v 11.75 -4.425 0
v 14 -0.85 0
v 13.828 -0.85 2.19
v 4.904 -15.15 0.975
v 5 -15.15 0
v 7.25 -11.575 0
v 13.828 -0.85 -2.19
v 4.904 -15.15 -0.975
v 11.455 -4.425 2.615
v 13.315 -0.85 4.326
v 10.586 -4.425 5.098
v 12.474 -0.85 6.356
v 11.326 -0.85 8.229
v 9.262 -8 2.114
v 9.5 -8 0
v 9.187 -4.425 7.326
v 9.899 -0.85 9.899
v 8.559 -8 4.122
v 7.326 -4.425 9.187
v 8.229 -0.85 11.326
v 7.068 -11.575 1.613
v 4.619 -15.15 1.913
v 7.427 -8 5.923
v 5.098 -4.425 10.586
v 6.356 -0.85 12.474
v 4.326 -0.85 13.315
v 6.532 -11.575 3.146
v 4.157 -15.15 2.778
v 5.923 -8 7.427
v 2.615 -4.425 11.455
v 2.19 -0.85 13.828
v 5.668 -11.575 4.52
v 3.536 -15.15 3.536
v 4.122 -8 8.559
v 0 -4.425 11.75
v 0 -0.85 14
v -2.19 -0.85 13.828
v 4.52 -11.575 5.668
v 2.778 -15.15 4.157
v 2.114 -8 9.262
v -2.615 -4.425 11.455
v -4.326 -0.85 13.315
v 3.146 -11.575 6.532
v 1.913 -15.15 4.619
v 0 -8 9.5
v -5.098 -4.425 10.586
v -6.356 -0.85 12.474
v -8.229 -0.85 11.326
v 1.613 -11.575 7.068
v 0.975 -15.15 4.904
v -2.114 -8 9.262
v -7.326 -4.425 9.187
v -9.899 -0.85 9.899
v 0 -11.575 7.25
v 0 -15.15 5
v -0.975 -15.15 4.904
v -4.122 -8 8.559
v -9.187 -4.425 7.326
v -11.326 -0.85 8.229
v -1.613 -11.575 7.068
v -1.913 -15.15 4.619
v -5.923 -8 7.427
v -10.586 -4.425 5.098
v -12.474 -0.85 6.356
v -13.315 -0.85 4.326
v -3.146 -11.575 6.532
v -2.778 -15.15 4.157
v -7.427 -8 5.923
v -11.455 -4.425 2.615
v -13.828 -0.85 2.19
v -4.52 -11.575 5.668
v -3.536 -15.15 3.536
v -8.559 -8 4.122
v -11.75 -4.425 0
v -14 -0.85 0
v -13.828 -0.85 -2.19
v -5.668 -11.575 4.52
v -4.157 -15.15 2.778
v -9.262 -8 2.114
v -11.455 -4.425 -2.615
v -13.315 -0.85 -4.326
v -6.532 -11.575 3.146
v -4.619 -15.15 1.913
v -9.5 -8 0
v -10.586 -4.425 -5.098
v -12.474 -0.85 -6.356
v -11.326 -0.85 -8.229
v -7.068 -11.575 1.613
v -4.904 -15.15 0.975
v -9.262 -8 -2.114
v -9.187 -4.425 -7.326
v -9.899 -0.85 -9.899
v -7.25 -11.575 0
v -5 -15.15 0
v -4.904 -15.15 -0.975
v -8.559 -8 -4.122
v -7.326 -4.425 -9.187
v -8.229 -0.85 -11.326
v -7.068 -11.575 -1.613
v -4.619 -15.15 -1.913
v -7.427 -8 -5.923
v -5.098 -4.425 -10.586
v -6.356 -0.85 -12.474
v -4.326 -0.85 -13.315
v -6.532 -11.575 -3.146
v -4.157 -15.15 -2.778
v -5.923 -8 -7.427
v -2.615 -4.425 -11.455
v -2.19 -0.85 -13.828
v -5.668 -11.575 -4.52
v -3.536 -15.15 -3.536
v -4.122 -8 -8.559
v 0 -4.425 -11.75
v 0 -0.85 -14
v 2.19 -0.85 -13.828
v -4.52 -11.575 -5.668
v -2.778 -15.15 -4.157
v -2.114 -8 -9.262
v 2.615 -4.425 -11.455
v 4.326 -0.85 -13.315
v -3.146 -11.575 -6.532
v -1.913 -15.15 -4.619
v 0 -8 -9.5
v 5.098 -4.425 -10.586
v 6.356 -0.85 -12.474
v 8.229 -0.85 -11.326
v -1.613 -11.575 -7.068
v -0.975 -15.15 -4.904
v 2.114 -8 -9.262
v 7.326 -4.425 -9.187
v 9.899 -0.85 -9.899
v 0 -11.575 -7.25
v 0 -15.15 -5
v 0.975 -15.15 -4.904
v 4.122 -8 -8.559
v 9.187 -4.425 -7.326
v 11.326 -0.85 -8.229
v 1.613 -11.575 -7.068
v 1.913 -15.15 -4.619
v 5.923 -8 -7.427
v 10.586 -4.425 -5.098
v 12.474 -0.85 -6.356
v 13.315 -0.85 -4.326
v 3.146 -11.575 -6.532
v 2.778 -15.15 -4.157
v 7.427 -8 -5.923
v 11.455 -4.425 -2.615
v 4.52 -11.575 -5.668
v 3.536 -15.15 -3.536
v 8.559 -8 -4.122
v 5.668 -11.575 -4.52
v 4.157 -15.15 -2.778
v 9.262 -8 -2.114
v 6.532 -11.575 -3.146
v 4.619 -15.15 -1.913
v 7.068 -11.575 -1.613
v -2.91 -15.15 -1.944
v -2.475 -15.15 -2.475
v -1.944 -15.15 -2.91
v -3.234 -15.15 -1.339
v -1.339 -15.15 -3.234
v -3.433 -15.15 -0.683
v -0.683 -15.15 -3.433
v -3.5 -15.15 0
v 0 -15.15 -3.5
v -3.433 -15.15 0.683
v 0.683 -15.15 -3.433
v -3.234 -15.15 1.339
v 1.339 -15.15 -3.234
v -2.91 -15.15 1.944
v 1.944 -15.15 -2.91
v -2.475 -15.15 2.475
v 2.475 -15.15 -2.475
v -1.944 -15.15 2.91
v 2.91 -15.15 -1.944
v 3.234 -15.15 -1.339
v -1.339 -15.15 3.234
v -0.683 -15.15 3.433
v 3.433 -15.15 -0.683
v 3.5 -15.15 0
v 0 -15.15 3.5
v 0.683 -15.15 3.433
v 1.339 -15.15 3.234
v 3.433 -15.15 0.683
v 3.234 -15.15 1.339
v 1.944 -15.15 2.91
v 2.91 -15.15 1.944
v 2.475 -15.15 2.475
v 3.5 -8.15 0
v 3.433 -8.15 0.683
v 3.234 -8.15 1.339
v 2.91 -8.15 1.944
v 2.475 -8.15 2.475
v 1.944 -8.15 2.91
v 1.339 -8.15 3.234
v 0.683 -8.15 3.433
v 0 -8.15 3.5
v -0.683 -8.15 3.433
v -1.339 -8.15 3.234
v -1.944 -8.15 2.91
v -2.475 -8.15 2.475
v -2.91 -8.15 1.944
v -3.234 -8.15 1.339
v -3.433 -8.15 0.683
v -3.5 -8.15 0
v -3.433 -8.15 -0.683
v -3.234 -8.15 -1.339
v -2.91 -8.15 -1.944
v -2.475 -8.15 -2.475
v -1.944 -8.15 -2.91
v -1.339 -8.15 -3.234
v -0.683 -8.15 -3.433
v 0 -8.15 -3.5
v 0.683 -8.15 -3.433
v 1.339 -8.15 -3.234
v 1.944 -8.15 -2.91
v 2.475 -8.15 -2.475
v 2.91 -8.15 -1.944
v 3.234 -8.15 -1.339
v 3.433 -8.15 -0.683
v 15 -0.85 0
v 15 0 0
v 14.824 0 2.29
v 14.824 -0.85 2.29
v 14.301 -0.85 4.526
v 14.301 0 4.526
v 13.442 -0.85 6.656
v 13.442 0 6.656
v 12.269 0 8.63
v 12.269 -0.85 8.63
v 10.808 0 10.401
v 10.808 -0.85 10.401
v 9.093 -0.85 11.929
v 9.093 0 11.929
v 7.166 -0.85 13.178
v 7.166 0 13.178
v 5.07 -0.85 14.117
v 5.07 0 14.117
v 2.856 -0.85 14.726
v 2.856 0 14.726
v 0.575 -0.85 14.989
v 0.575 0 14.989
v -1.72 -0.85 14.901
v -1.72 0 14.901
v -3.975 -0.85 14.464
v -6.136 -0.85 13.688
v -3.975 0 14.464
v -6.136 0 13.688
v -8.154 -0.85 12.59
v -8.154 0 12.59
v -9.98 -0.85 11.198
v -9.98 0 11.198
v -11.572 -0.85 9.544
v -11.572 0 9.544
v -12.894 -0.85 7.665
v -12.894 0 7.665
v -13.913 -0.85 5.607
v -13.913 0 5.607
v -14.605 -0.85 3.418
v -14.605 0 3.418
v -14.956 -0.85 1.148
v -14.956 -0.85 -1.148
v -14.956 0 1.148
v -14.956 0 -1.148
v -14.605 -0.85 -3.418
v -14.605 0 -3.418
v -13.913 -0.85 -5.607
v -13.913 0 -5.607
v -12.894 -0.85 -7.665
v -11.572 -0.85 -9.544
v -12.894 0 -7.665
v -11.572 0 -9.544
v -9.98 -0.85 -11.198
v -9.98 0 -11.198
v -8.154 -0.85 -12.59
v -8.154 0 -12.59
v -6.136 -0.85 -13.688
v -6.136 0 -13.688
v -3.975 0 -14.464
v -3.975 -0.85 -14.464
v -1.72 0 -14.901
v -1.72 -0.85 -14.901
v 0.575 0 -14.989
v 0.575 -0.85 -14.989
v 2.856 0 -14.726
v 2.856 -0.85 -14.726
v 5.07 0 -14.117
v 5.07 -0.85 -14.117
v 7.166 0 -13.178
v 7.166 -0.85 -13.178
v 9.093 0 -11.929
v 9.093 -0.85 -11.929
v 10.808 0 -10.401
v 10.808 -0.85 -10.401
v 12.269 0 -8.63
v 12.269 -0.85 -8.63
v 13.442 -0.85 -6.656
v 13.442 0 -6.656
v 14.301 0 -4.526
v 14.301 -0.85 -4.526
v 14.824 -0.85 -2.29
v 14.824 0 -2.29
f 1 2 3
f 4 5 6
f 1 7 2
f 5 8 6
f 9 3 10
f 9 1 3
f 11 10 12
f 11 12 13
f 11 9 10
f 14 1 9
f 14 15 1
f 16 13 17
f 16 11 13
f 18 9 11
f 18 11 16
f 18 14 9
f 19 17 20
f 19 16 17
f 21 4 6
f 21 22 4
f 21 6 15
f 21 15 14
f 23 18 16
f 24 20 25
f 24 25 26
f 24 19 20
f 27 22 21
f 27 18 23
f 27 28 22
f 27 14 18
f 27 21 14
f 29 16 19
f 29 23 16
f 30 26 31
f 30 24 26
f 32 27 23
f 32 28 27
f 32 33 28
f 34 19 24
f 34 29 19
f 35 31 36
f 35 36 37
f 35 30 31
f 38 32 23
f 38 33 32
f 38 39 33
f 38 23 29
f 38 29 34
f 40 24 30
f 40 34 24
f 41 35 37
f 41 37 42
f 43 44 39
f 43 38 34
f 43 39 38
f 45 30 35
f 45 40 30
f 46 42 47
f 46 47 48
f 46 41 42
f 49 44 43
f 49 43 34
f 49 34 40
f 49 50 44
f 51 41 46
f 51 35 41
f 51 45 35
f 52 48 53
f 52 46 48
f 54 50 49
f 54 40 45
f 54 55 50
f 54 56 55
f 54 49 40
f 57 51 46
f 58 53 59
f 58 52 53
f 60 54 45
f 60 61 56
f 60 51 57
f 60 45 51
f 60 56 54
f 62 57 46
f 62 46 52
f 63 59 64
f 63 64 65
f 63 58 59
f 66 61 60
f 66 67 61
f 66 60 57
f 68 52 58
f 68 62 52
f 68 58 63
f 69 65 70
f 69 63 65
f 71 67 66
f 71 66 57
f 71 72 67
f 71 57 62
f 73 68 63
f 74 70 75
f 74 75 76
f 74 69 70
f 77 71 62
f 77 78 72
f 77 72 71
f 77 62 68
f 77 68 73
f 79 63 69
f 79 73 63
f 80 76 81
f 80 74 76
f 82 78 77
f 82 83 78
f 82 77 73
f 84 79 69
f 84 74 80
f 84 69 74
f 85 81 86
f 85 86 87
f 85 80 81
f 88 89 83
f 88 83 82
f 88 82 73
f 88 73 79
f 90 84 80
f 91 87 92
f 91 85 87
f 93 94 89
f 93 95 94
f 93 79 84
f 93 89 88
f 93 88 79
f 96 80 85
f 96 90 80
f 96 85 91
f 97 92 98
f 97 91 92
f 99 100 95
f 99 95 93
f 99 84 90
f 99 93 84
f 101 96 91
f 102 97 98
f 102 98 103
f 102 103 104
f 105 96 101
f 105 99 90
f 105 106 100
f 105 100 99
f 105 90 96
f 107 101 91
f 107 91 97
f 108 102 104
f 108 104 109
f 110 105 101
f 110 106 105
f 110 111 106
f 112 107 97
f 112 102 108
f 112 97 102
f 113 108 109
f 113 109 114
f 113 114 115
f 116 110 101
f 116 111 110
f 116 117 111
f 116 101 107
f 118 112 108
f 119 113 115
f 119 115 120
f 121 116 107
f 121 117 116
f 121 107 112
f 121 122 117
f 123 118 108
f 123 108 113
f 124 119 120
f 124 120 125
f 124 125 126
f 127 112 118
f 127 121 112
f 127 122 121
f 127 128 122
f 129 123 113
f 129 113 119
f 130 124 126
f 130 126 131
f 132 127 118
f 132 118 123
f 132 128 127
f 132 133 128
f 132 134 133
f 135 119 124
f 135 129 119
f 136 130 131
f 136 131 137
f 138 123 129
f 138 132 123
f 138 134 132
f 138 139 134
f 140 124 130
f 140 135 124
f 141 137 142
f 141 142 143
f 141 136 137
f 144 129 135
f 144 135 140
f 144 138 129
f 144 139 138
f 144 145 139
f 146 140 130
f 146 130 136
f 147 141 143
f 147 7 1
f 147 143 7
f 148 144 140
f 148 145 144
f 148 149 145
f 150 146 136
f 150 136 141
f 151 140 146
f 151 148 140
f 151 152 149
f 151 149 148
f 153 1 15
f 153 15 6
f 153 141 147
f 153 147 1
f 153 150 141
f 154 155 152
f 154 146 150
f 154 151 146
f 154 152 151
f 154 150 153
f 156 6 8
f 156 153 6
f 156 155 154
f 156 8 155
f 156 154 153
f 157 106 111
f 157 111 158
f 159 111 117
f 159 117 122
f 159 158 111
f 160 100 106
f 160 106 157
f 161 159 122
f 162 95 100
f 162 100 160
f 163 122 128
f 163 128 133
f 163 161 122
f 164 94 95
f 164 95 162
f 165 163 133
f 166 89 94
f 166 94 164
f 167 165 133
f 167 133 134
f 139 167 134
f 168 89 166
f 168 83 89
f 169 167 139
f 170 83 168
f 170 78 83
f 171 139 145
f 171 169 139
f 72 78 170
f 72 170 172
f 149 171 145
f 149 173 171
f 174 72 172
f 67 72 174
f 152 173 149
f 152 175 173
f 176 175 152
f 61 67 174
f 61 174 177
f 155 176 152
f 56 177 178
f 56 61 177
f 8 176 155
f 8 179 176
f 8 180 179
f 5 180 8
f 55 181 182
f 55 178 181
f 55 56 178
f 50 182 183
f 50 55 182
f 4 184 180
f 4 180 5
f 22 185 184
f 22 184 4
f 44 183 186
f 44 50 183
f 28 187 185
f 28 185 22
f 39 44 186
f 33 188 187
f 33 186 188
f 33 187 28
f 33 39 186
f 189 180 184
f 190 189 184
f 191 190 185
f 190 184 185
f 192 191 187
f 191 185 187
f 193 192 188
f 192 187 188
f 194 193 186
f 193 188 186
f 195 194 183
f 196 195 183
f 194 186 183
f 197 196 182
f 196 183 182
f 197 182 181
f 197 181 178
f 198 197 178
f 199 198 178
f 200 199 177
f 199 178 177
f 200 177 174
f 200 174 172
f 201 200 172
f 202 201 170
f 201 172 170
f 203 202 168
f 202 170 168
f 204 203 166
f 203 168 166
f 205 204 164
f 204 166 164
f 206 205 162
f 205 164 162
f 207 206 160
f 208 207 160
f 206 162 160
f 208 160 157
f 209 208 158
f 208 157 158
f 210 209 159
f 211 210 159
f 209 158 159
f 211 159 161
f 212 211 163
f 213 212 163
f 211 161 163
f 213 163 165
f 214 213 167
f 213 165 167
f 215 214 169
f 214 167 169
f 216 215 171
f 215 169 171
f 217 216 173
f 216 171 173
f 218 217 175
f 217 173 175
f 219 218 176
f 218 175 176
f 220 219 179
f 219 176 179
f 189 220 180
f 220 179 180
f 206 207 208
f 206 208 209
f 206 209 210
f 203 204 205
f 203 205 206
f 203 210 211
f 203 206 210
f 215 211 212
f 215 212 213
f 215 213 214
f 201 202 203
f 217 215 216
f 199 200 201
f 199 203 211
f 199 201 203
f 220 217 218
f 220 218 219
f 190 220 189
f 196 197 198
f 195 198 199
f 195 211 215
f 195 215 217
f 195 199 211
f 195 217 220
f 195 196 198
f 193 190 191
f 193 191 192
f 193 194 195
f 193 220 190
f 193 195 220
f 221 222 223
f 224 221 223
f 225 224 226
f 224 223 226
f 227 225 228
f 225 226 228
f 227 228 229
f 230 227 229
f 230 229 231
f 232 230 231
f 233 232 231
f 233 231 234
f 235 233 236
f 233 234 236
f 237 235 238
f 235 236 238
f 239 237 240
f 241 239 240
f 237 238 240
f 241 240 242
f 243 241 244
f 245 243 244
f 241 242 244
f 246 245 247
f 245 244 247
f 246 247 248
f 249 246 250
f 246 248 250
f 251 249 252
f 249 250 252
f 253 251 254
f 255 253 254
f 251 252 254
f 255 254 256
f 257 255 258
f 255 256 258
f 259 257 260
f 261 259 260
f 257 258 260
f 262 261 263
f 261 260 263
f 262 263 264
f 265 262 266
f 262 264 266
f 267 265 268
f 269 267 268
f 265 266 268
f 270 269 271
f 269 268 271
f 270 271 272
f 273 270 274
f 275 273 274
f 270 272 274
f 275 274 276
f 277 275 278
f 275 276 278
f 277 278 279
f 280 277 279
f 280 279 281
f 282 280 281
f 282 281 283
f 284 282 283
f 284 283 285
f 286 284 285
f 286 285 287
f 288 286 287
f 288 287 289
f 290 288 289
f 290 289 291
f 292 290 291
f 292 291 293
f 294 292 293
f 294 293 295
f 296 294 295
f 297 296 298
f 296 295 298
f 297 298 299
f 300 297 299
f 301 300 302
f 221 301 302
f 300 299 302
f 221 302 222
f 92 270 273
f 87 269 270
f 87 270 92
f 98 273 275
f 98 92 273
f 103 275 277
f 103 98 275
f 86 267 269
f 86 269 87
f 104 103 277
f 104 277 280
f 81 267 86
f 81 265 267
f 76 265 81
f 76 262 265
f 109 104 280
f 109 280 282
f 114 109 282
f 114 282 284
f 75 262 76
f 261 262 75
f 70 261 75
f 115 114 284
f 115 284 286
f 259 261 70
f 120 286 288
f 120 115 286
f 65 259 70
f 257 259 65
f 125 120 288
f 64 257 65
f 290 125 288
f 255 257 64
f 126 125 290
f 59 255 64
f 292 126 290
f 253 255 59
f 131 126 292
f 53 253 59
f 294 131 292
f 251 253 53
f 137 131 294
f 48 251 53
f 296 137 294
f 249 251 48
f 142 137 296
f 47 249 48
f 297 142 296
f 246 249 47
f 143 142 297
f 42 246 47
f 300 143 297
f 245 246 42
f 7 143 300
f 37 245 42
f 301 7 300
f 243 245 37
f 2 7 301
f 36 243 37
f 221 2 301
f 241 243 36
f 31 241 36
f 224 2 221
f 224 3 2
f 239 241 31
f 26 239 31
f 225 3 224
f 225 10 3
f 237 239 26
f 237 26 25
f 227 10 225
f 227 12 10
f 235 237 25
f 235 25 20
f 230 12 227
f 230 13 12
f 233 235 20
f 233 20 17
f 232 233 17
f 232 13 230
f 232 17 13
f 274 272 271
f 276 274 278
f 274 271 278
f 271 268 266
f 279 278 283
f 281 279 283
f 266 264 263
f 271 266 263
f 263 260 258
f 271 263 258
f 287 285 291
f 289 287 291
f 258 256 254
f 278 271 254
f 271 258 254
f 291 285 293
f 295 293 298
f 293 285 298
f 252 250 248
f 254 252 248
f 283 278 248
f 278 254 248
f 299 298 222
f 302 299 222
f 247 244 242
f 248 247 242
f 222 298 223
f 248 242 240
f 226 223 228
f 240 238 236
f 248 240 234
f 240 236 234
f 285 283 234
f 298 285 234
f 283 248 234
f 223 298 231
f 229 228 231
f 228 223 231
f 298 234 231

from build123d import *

# Parameters (mm, degrees)
F0_R     = 15
F0_R_2   = 14
F1_DEPTH = 0.85
F4_R     = 14
F3_R     = 5
F6_R     = 3.5
F7_DEPTH = 7


with BuildPart() as f1:
    # F0 (on Front) → F1 (new body)
    with BuildSketch(Plane.XZ):
        Circle(F0_R)
        Circle(F0_R_2, mode=Mode.SUBTRACT)
        Circle(F0_R_2)
    extrude(amount=F1_DEPTH)

    # F4 (on face) → F5 section 0
    with BuildSketch(Plane.XZ.offset(0.85)):
        Circle(F4_R)
    # F3 (on offset) → F5 section 1
    with BuildSketch(Plane.XZ.offset(15.15)):
        Circle(F3_R)
    loft()

    # F6 (on face) → F7 (cut)
    with BuildSketch(Plane.XZ.offset(15.15)):
        Circle(F6_R)
    extrude(amount=-F7_DEPTH, mode=Mode.SUBTRACT)


solid = f1.part
